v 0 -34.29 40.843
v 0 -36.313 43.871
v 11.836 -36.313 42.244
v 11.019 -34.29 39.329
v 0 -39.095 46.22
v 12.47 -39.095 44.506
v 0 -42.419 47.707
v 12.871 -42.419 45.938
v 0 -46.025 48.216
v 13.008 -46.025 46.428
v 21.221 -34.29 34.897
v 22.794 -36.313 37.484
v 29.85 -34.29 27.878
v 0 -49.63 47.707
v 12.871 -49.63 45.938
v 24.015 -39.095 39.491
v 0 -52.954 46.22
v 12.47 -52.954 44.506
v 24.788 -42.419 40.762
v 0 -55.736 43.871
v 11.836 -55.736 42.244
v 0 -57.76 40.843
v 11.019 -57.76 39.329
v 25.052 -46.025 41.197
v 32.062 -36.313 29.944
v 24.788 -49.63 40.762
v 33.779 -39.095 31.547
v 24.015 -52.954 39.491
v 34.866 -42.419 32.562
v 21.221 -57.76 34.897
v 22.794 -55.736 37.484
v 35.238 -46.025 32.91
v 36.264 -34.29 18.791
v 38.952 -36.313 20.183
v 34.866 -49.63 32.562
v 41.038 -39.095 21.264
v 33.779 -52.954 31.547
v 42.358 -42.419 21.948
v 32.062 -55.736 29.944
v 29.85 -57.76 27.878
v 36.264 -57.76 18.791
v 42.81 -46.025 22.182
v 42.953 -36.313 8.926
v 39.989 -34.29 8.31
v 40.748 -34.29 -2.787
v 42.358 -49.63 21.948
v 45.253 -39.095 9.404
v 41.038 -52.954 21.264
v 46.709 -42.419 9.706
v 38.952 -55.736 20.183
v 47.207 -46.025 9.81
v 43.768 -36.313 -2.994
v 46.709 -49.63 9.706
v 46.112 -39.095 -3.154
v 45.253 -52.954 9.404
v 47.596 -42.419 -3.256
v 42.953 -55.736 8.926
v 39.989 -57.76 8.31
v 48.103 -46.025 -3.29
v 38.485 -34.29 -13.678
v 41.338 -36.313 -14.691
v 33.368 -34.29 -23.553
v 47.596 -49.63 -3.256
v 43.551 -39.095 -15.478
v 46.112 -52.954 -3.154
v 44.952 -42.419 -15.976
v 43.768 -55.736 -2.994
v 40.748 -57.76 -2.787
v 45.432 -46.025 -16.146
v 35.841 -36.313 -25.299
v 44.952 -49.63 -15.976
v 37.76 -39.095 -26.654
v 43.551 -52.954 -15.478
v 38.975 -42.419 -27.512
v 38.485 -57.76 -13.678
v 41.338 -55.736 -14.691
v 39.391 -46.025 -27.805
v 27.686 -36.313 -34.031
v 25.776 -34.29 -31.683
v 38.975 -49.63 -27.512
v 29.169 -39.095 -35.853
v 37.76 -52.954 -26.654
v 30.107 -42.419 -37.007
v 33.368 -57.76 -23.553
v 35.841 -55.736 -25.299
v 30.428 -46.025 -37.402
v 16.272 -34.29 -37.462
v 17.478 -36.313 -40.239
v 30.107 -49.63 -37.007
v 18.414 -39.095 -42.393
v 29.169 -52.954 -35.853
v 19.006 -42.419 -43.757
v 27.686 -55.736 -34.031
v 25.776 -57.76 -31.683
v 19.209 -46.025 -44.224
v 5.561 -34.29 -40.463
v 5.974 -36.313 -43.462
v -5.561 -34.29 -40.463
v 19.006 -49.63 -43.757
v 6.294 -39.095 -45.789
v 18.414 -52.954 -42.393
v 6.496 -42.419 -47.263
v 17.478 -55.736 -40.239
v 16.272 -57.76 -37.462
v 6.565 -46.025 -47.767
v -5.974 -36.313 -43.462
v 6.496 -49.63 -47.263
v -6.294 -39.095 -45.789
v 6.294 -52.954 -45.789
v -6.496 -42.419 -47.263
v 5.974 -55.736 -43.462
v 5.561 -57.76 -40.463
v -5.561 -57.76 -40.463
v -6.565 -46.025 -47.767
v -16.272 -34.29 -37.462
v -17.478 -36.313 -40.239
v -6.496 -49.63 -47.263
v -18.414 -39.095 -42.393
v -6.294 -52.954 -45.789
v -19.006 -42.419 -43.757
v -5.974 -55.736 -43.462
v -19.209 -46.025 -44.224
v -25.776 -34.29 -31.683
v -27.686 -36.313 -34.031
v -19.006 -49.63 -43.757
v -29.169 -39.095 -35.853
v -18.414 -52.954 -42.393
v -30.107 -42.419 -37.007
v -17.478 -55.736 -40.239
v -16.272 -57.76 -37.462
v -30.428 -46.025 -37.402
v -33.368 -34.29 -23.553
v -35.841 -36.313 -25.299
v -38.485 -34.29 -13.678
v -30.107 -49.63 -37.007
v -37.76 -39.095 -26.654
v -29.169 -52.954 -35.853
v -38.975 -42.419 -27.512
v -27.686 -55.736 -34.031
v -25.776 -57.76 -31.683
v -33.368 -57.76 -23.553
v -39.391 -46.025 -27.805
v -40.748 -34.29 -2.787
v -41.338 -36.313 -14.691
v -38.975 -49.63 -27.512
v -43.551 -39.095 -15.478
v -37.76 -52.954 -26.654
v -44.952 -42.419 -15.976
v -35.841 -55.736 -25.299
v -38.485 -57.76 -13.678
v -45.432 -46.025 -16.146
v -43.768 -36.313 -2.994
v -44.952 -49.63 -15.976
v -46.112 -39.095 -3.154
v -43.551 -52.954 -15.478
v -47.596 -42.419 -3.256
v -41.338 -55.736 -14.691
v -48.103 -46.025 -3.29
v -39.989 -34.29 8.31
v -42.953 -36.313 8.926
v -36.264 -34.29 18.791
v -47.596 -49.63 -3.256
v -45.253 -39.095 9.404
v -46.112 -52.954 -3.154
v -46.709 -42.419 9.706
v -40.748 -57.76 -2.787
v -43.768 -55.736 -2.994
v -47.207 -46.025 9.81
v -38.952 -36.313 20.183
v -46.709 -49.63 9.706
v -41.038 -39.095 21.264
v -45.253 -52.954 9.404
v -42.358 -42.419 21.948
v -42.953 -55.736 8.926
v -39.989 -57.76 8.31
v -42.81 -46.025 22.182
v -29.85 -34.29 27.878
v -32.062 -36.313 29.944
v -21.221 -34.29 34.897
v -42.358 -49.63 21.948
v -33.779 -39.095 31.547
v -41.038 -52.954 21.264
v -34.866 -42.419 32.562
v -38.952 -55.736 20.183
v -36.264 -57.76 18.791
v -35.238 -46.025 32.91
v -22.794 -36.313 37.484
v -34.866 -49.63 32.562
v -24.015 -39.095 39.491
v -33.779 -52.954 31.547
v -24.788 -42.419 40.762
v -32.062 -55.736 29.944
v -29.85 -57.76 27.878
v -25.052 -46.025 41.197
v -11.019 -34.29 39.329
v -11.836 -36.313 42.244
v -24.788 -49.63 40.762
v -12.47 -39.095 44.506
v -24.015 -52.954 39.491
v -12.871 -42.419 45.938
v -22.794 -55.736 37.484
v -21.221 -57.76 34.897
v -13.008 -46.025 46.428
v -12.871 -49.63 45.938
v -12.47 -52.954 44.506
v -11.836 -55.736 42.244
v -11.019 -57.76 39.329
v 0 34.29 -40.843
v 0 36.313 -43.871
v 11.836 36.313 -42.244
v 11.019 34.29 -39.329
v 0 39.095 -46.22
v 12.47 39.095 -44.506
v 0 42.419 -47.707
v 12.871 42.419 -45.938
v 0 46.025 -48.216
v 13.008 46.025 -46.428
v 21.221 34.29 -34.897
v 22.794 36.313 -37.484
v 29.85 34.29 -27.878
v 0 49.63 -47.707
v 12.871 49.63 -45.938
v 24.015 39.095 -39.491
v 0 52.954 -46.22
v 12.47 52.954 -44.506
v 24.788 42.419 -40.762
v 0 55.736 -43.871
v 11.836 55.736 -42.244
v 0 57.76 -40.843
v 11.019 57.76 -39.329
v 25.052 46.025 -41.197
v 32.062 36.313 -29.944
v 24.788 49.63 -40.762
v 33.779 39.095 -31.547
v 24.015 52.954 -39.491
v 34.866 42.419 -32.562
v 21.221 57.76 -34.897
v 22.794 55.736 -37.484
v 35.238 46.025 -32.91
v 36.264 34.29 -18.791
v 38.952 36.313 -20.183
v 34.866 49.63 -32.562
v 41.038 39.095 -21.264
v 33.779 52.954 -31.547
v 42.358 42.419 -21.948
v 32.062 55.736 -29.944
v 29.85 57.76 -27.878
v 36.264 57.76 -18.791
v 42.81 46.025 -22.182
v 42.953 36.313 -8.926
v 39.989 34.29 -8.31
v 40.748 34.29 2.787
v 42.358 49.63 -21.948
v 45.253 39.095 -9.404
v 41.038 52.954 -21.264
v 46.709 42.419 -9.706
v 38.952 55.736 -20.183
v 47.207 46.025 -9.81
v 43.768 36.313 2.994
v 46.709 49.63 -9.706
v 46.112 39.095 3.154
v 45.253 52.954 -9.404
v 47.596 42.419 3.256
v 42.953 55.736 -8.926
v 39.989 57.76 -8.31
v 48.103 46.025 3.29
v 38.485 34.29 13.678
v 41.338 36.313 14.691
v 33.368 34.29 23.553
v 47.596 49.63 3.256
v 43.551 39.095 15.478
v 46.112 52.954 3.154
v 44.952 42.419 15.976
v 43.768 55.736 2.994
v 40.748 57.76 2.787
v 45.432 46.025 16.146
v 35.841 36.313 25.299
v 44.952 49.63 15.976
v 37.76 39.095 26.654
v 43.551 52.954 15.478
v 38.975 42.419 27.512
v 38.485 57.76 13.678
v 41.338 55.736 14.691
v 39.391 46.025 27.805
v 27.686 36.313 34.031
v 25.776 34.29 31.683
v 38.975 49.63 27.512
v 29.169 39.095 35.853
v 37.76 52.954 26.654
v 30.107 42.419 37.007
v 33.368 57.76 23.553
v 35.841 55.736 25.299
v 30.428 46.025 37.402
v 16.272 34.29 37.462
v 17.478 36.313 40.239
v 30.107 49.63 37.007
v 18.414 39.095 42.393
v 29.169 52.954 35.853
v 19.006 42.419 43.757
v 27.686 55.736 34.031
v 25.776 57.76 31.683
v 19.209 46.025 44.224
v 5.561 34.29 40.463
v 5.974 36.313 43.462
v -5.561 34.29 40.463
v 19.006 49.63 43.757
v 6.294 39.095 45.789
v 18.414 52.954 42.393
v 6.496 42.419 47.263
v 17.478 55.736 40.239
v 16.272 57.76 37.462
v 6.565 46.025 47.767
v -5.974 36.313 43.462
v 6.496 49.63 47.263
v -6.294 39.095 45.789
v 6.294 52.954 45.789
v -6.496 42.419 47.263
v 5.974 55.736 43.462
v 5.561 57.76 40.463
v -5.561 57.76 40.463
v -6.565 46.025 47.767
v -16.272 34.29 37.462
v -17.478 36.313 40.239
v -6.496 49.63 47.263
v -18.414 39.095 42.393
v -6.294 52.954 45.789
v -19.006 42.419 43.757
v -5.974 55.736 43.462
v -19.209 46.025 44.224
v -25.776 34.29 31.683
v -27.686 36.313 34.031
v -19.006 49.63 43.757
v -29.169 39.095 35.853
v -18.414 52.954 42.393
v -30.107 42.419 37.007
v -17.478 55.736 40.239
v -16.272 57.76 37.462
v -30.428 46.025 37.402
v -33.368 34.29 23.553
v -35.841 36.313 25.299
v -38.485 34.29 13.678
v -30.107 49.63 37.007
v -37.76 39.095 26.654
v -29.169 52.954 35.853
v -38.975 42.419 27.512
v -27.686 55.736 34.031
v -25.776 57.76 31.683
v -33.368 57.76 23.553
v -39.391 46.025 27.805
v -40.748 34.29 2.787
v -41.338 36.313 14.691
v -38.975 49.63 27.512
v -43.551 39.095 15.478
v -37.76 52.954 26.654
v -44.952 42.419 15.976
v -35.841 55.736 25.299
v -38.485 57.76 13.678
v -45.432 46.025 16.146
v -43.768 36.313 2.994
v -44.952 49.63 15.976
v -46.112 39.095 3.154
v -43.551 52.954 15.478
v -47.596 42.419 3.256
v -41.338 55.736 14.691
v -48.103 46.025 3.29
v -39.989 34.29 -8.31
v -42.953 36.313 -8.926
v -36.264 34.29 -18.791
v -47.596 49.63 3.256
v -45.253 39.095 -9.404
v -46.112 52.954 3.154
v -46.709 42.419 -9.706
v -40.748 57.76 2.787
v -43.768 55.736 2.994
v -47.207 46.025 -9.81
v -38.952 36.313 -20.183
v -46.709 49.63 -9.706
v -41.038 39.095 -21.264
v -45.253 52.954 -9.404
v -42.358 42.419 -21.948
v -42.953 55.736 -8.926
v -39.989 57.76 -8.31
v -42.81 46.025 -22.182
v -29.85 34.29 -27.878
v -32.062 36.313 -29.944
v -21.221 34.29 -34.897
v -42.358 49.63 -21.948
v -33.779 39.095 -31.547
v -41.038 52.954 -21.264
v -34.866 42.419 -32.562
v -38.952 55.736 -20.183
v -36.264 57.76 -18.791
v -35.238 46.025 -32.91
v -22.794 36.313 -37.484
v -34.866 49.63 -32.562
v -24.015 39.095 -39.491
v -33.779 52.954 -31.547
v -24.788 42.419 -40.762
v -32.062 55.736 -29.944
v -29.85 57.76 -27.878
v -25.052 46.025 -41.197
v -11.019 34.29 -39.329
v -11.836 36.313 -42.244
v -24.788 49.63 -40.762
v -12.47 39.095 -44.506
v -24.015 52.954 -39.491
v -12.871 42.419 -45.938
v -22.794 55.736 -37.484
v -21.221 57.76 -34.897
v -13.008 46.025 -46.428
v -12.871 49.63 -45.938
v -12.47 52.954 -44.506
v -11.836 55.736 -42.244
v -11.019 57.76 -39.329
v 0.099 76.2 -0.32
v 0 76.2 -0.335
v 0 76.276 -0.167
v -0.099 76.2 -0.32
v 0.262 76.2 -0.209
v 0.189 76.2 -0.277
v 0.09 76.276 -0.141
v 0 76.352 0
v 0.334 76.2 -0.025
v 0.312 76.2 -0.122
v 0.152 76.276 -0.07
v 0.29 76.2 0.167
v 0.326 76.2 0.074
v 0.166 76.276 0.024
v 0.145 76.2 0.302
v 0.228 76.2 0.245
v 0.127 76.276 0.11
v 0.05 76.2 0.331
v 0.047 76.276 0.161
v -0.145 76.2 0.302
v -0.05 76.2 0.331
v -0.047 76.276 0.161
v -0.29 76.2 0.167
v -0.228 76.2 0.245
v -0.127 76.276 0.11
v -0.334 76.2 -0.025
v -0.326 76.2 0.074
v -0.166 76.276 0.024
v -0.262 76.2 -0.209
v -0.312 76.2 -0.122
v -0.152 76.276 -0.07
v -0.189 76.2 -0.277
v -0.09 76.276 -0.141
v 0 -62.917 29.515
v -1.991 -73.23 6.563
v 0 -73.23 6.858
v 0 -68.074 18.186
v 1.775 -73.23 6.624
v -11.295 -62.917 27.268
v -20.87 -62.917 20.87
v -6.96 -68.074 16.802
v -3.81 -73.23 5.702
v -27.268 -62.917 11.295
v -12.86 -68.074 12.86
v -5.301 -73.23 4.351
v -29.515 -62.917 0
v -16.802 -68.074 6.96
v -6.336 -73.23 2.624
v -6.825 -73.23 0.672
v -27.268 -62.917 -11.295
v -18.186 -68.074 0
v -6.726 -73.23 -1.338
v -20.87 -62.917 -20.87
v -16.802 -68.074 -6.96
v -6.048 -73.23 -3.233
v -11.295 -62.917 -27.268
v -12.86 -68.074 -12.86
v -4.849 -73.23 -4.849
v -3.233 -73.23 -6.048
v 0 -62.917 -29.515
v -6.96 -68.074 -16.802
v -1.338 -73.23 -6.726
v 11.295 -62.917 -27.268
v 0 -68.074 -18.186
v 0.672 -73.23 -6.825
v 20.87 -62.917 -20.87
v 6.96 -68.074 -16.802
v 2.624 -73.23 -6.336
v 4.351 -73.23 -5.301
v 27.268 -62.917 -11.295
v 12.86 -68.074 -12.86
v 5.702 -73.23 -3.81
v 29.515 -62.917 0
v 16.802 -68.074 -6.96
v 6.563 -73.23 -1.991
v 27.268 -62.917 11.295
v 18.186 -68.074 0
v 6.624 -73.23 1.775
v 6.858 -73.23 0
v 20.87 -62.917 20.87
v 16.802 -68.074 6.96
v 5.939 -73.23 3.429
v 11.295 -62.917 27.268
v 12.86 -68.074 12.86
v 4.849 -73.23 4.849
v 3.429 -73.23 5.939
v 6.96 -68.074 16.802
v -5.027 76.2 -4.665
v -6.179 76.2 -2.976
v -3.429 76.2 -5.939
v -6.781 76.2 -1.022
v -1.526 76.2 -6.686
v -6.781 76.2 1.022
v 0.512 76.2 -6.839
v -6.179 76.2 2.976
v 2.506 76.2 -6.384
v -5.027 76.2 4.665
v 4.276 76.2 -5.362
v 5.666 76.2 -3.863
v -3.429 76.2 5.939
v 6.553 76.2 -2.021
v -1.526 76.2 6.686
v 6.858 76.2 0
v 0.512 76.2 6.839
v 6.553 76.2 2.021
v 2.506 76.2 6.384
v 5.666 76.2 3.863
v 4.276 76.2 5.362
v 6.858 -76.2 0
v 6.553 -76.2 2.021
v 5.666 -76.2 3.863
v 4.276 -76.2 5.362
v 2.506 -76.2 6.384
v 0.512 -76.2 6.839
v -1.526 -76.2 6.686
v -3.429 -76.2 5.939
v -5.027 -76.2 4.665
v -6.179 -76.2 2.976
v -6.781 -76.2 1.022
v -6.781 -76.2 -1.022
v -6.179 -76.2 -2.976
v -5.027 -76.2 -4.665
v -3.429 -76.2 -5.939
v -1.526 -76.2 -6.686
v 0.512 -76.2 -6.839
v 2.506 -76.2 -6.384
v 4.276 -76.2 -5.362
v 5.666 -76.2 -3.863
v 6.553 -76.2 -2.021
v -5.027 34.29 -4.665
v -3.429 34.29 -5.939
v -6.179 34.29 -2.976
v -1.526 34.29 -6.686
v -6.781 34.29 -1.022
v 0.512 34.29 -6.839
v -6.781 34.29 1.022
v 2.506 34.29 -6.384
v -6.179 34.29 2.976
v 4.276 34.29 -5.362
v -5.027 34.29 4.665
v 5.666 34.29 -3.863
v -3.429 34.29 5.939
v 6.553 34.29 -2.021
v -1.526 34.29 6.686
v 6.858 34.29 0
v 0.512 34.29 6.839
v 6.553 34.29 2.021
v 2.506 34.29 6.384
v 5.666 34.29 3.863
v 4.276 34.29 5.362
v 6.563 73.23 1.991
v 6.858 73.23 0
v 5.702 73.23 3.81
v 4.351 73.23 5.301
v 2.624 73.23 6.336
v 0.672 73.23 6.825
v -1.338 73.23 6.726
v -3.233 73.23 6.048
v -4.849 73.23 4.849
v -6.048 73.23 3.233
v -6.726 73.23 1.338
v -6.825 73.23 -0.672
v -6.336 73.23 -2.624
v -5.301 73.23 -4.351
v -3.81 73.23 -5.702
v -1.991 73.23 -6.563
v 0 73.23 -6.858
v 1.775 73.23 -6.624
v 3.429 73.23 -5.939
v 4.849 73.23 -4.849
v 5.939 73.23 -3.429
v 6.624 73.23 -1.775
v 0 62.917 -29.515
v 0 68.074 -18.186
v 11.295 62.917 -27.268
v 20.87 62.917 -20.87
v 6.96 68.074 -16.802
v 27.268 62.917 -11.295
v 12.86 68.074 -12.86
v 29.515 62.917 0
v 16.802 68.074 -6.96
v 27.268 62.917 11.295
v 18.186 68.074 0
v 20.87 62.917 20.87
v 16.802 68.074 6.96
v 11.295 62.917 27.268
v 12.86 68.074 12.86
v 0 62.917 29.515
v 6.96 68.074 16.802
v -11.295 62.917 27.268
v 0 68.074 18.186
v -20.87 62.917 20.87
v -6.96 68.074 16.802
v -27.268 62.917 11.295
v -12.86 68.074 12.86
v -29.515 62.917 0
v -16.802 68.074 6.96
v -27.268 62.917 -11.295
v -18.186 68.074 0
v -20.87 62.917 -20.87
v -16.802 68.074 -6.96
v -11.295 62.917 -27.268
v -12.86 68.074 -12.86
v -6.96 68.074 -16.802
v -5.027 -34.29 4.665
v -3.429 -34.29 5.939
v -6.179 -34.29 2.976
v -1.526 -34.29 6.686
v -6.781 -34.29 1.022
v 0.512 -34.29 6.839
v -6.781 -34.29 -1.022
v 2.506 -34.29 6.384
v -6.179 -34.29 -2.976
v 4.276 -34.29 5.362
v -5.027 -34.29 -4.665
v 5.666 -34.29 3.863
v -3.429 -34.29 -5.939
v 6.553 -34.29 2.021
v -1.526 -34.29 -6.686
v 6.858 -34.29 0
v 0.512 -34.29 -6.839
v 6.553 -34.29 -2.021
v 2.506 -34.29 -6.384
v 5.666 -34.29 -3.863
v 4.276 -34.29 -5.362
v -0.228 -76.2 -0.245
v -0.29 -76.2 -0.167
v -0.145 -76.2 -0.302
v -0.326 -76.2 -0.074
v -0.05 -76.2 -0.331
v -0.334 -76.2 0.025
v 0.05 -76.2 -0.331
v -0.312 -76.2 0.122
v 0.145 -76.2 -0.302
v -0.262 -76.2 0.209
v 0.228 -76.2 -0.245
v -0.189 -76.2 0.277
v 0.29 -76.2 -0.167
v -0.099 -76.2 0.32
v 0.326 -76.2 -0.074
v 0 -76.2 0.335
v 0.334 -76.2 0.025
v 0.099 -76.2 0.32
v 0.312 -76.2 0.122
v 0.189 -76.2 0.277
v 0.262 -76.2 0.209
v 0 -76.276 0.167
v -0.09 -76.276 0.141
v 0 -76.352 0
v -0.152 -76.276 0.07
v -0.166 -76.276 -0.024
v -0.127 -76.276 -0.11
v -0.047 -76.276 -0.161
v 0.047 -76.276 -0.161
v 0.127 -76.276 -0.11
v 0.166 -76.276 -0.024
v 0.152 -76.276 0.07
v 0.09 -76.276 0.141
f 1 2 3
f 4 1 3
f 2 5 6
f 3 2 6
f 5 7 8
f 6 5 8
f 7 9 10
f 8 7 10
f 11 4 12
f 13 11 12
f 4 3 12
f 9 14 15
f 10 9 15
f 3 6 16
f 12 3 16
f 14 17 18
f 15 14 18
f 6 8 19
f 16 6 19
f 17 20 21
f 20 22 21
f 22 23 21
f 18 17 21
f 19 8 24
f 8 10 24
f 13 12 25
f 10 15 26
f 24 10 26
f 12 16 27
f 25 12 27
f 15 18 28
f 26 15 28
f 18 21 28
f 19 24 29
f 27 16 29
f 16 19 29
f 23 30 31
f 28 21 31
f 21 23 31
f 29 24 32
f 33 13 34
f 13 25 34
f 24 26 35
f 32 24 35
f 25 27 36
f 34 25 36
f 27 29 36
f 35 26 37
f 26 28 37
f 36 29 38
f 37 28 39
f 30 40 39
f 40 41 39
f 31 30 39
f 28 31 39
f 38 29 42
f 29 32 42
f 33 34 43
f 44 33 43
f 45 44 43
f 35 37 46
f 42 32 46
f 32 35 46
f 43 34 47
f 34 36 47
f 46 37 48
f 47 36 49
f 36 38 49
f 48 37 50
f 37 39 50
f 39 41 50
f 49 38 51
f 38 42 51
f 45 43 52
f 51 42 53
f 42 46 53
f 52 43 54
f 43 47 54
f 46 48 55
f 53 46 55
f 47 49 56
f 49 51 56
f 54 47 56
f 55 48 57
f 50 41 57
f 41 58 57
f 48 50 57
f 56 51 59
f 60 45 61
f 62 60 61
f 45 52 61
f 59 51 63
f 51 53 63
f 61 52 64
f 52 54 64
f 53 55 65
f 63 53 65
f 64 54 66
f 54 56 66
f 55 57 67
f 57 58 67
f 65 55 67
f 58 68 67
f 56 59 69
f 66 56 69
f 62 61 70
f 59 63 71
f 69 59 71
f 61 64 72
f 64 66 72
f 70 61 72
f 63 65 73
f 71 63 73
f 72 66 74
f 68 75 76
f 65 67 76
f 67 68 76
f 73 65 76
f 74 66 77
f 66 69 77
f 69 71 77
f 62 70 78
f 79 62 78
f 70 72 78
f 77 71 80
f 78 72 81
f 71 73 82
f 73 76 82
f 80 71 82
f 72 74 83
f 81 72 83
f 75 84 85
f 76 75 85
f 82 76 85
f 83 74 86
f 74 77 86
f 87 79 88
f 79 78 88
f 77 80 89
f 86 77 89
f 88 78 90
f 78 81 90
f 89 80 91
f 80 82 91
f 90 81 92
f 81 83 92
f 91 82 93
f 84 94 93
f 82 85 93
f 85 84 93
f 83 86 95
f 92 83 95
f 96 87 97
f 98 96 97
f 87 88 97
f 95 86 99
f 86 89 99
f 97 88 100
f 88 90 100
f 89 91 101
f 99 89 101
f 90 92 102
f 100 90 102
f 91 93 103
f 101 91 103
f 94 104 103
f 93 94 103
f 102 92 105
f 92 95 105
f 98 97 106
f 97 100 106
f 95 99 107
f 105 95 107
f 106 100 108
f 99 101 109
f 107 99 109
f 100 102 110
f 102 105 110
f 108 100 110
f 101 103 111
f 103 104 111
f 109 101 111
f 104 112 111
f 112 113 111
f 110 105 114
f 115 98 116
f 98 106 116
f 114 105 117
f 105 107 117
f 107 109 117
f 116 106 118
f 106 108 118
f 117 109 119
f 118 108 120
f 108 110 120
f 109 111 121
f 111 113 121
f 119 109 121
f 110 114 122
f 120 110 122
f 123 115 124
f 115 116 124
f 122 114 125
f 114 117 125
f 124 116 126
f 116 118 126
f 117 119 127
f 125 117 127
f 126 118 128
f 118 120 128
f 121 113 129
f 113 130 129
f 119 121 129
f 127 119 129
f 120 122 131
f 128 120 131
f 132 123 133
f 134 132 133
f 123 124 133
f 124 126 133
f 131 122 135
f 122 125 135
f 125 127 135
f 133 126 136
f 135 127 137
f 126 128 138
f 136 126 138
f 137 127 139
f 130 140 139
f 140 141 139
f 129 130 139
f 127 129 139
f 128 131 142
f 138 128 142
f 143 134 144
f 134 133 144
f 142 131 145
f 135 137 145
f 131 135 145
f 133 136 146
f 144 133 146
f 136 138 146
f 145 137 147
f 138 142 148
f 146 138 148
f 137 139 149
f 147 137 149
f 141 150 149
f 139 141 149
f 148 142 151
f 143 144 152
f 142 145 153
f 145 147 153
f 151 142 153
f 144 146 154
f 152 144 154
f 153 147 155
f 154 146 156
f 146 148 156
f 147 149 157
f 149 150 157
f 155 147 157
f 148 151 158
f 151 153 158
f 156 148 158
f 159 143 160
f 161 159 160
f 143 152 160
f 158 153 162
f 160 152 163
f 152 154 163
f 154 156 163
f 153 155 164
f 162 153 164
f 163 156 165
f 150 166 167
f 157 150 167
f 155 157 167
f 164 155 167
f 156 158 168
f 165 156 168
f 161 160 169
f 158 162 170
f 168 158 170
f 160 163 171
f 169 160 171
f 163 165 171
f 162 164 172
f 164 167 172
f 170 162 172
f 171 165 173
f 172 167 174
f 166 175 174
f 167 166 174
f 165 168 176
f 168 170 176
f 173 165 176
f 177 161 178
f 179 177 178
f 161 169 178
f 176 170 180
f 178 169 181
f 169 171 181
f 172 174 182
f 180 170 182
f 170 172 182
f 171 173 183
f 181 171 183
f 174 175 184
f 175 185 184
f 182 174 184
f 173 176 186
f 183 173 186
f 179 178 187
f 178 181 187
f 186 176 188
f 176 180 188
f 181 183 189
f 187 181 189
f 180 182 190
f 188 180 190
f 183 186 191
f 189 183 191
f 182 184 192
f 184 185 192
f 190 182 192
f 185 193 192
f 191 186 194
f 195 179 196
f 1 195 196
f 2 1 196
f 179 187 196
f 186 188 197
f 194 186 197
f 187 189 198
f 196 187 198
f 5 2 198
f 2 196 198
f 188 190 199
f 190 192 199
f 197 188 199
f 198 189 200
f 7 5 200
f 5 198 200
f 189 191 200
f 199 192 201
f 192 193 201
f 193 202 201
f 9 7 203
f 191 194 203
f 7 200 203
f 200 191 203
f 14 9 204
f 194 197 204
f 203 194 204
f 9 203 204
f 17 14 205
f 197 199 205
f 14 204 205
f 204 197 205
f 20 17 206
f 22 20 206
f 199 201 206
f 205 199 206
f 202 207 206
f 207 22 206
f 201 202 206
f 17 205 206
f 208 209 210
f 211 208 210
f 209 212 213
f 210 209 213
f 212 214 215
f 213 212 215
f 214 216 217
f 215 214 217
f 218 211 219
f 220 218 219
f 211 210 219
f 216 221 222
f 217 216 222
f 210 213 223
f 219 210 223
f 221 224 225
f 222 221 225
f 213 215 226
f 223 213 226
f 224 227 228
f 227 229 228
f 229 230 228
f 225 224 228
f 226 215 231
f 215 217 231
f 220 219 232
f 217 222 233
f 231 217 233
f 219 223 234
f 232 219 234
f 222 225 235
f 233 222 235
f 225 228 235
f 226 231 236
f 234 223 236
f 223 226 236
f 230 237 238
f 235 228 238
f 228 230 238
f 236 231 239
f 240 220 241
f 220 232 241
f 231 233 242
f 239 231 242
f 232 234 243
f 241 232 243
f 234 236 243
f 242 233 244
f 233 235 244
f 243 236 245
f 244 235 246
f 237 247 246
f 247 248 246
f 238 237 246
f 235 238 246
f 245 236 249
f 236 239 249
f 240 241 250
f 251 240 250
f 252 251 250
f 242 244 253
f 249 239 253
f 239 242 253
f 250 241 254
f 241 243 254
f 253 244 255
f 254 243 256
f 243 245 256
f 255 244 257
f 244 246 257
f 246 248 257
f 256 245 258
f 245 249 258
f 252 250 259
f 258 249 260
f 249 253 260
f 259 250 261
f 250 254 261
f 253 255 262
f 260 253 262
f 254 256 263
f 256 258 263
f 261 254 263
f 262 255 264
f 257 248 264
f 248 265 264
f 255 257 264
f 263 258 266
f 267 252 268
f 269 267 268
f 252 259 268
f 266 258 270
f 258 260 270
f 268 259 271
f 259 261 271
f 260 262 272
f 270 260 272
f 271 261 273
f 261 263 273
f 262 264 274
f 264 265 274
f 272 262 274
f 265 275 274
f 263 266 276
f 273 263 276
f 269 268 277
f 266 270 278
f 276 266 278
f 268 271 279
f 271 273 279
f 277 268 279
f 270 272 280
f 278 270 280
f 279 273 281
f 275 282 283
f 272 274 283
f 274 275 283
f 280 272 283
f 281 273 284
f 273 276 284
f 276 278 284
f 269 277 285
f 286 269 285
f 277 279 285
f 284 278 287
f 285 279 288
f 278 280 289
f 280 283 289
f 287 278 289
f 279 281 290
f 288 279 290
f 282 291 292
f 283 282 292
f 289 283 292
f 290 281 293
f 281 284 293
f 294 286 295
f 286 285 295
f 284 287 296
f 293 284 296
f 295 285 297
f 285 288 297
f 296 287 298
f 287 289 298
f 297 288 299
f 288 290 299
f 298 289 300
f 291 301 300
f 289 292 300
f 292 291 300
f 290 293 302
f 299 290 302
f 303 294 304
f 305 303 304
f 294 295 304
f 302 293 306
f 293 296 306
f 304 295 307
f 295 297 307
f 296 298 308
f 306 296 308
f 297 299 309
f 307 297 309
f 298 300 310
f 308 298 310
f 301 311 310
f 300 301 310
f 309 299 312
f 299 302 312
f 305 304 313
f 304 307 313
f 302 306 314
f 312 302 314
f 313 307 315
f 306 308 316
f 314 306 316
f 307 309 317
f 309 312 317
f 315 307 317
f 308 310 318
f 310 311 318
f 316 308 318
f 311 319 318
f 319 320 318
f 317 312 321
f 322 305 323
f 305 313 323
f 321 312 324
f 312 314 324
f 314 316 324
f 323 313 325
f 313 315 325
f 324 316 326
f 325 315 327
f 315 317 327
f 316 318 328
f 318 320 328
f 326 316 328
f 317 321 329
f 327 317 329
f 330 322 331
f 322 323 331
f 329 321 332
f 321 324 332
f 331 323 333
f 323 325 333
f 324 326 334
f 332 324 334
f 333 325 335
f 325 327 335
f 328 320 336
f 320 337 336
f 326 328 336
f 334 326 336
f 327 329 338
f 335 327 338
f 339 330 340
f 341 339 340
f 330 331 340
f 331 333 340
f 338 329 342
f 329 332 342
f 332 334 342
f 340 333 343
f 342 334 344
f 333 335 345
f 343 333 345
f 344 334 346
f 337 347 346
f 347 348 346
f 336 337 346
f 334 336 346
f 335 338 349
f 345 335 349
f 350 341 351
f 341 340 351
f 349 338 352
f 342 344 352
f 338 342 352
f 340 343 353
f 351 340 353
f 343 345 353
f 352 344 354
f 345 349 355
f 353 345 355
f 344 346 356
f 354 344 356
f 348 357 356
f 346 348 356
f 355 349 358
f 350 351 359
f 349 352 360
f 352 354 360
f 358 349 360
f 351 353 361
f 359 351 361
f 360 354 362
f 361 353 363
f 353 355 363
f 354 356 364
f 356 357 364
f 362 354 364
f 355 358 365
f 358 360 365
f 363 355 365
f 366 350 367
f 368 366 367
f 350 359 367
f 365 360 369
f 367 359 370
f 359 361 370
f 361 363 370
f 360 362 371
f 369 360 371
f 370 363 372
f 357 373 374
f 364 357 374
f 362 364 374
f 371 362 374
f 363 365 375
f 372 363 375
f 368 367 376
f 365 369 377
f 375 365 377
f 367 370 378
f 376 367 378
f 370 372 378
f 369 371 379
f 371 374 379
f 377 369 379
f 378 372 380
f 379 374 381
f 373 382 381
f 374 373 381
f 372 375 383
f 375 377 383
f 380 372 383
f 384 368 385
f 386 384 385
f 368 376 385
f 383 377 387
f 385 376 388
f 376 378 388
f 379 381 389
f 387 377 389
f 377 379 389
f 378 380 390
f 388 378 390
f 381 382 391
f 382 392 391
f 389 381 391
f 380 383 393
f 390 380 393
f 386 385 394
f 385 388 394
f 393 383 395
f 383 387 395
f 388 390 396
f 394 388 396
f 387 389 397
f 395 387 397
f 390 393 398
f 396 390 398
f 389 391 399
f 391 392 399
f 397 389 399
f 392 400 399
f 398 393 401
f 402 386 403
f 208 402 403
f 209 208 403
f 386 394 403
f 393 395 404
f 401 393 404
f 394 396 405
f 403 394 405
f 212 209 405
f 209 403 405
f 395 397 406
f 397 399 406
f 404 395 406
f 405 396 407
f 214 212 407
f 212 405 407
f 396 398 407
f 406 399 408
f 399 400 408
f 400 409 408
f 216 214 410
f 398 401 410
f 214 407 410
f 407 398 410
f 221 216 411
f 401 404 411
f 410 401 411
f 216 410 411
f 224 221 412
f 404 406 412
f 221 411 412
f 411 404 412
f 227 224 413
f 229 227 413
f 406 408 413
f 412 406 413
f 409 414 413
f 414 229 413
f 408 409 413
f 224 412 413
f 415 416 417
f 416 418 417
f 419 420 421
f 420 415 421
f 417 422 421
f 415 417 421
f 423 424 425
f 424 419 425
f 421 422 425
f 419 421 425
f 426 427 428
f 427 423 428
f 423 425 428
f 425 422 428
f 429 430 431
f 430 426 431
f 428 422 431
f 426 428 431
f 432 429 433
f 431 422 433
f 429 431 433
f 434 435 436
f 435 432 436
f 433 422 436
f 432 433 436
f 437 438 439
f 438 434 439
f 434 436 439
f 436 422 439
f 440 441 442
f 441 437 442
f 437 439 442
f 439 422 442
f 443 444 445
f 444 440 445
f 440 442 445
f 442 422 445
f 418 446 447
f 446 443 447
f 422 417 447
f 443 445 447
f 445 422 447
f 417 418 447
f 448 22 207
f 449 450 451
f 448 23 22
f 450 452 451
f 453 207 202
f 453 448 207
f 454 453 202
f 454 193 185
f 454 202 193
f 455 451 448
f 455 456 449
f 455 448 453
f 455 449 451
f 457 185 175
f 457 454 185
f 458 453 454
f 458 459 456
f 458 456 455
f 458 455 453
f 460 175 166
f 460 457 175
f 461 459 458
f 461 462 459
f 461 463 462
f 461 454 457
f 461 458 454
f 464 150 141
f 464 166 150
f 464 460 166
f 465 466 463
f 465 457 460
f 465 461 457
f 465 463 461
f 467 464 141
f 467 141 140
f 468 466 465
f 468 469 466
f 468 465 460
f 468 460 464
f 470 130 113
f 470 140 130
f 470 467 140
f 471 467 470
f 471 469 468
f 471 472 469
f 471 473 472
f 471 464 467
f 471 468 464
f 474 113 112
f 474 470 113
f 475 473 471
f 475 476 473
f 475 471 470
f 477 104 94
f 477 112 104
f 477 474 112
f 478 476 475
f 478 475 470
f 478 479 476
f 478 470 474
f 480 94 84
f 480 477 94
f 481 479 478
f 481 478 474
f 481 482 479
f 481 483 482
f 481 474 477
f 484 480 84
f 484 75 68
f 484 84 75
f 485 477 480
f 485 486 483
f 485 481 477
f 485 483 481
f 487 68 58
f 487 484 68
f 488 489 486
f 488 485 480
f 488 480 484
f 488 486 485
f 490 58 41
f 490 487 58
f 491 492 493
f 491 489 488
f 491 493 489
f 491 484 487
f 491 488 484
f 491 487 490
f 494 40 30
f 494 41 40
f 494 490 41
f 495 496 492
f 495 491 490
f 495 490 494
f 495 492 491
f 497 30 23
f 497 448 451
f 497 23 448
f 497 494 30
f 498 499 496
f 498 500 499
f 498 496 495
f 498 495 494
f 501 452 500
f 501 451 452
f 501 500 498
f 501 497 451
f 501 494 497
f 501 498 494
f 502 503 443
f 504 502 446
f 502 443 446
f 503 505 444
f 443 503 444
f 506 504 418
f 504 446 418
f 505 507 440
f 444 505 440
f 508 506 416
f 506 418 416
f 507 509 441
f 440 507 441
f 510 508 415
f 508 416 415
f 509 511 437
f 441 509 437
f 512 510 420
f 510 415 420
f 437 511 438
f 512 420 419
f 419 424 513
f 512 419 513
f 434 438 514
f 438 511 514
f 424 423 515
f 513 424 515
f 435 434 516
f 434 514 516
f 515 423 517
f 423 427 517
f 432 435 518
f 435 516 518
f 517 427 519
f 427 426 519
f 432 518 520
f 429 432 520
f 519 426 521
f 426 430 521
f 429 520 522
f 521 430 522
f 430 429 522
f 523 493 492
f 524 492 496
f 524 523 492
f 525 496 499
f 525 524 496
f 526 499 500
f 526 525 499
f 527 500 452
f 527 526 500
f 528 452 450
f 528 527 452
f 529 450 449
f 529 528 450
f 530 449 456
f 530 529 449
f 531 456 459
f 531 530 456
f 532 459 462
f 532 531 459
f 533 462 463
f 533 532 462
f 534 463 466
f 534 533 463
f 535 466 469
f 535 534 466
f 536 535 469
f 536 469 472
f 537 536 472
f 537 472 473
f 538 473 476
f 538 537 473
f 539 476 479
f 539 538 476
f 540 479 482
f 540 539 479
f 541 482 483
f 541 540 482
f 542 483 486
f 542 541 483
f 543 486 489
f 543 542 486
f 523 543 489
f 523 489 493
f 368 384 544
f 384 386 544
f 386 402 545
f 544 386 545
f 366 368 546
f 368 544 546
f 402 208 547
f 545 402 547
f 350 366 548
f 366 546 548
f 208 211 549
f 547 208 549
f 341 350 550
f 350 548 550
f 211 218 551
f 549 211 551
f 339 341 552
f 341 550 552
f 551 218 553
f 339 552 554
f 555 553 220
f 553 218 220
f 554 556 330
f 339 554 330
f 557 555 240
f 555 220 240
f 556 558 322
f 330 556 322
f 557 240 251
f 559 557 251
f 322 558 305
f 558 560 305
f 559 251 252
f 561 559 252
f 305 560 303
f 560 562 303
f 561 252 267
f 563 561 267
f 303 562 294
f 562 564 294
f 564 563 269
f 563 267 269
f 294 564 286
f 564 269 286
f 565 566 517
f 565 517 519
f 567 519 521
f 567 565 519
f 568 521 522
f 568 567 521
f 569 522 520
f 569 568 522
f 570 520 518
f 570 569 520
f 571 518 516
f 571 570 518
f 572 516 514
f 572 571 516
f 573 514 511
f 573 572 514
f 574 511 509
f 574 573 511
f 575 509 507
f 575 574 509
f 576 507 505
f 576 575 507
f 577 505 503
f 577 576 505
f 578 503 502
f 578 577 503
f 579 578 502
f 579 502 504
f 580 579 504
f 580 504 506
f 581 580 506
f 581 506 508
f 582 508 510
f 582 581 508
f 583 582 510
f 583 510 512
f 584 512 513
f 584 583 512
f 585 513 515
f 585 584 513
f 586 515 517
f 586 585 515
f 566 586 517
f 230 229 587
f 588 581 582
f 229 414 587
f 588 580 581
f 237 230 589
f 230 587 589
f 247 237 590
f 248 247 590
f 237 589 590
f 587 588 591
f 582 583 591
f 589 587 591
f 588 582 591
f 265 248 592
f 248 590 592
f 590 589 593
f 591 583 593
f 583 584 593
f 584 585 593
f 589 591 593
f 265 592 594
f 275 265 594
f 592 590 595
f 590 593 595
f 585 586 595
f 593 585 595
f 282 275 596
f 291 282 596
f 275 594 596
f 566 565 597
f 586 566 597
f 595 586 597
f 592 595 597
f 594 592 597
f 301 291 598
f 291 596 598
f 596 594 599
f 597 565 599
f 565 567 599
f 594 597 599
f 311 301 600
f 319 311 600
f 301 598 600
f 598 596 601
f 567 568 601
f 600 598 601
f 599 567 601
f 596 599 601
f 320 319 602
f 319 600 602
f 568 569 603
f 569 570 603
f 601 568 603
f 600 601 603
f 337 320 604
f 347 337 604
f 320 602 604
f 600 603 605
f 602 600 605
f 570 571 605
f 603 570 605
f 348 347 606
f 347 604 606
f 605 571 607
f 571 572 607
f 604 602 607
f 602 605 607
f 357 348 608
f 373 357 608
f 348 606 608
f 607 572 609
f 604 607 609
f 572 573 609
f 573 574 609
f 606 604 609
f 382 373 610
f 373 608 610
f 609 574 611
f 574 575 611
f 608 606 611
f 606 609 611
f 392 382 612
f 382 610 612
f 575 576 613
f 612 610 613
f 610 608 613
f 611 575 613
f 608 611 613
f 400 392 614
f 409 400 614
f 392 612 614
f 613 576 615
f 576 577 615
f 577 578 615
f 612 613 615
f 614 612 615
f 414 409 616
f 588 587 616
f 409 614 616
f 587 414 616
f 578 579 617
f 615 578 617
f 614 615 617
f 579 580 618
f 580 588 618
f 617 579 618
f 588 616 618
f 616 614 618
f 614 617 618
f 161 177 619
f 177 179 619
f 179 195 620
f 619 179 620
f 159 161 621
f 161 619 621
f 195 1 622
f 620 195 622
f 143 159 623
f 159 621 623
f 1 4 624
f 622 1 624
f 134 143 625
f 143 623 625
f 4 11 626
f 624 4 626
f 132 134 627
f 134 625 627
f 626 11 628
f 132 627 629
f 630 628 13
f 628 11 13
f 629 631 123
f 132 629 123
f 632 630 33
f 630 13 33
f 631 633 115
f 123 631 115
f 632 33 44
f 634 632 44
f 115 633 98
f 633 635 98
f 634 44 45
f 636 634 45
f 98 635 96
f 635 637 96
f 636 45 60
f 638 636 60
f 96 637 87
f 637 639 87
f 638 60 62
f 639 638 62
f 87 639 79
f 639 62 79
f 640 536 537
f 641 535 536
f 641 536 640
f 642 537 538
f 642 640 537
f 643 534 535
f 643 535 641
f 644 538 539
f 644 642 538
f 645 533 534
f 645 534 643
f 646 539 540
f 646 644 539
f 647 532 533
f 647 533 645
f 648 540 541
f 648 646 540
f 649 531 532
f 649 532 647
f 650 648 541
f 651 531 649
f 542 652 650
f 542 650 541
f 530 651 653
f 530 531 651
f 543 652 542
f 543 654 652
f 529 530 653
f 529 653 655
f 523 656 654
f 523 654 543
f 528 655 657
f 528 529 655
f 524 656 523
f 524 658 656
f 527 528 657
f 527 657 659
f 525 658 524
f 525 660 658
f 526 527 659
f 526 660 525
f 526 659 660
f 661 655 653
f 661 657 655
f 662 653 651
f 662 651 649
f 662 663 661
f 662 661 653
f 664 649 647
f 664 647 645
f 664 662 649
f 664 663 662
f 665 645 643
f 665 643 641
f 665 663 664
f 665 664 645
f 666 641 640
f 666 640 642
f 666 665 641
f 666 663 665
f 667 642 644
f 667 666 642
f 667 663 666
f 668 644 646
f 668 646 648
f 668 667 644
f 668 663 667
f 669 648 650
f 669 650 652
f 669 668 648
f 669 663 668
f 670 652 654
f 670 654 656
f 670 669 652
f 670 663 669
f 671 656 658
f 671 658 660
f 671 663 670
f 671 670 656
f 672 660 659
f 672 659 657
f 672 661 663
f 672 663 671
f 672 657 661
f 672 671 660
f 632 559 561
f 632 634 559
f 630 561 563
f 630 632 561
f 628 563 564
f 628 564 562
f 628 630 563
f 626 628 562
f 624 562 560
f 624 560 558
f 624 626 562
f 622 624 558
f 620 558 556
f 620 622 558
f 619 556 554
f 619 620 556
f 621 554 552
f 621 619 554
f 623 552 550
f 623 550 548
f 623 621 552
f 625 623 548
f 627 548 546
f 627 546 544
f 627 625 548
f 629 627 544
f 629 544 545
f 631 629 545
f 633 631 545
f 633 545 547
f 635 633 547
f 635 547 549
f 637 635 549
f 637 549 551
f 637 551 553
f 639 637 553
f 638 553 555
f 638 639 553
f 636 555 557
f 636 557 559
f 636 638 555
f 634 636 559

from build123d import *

# Parameters (mm, degrees)
F0_R          = 6.858
F1_DEPTH      = 76.2
F1_DEPTH_BACK = 76.2


with BuildPart() as f1:
    # F0 (on Front) → F1 (new body, two sides)
    with BuildSketch(Plane.XZ) as f1_sk:
        Circle(F0_R)
    extrude(amount=F1_DEPTH)
    extrude(f1_sk.sketch, amount=-F1_DEPTH_BACK)

    # F2 (on Right) → F3 (revolve)
    with BuildSketch(Plane.YZ):
        with BuildLine():
            Line((-57.759602, 0), (-34.290001, 0))
            Line((-34.290001, 0), (-34.290001, 40.8432))
            ThreePointArc((-34.290001, 40.8432), (-46.024801, 48.215831), (-57.759602, 40.8432))
            Line((-57.759602, 40.8432), (-57.759602, 0))
        make_face()
    revolve(axis=Axis((0, -46.024801, 0), (0, 1, 0)))

    # F2 (on Right) → F4 (revolve)
    with BuildSketch(Plane.YZ):
        with BuildLine():
            Line((57.759602, 0), (34.290001, 0))
            Line((34.290001, 0), (34.290001, -40.8432))
            ThreePointArc((34.290001, -40.8432), (46.024801, -48.215831), (57.759602, -40.8432))
            Line((57.759602, -40.8432), (57.759602, 0))
        make_face()
    revolve(axis=Axis((0, 46.024801, 0), (0, -1, 0)))

    # F2 (on Right) → F5 (revolve)
    with BuildSketch(Plane.YZ):
        Polygon((76.352403, 0), (57.759602, 0), (57.759602, -40.8432), align=None)
    revolve(axis=Axis((0, 67.056002, 0), (0, -1, 0)))

    # F2 (on Right) → F6 (revolve)
    with BuildSketch(Plane.YZ):
        Polygon((-76.352403, 0), (-57.759602, 0), (-57.759602, 40.8432), align=None)
    revolve(axis=Axis((0, -67.056002, 0), (0, -1, 0)))


solid = f1.part
